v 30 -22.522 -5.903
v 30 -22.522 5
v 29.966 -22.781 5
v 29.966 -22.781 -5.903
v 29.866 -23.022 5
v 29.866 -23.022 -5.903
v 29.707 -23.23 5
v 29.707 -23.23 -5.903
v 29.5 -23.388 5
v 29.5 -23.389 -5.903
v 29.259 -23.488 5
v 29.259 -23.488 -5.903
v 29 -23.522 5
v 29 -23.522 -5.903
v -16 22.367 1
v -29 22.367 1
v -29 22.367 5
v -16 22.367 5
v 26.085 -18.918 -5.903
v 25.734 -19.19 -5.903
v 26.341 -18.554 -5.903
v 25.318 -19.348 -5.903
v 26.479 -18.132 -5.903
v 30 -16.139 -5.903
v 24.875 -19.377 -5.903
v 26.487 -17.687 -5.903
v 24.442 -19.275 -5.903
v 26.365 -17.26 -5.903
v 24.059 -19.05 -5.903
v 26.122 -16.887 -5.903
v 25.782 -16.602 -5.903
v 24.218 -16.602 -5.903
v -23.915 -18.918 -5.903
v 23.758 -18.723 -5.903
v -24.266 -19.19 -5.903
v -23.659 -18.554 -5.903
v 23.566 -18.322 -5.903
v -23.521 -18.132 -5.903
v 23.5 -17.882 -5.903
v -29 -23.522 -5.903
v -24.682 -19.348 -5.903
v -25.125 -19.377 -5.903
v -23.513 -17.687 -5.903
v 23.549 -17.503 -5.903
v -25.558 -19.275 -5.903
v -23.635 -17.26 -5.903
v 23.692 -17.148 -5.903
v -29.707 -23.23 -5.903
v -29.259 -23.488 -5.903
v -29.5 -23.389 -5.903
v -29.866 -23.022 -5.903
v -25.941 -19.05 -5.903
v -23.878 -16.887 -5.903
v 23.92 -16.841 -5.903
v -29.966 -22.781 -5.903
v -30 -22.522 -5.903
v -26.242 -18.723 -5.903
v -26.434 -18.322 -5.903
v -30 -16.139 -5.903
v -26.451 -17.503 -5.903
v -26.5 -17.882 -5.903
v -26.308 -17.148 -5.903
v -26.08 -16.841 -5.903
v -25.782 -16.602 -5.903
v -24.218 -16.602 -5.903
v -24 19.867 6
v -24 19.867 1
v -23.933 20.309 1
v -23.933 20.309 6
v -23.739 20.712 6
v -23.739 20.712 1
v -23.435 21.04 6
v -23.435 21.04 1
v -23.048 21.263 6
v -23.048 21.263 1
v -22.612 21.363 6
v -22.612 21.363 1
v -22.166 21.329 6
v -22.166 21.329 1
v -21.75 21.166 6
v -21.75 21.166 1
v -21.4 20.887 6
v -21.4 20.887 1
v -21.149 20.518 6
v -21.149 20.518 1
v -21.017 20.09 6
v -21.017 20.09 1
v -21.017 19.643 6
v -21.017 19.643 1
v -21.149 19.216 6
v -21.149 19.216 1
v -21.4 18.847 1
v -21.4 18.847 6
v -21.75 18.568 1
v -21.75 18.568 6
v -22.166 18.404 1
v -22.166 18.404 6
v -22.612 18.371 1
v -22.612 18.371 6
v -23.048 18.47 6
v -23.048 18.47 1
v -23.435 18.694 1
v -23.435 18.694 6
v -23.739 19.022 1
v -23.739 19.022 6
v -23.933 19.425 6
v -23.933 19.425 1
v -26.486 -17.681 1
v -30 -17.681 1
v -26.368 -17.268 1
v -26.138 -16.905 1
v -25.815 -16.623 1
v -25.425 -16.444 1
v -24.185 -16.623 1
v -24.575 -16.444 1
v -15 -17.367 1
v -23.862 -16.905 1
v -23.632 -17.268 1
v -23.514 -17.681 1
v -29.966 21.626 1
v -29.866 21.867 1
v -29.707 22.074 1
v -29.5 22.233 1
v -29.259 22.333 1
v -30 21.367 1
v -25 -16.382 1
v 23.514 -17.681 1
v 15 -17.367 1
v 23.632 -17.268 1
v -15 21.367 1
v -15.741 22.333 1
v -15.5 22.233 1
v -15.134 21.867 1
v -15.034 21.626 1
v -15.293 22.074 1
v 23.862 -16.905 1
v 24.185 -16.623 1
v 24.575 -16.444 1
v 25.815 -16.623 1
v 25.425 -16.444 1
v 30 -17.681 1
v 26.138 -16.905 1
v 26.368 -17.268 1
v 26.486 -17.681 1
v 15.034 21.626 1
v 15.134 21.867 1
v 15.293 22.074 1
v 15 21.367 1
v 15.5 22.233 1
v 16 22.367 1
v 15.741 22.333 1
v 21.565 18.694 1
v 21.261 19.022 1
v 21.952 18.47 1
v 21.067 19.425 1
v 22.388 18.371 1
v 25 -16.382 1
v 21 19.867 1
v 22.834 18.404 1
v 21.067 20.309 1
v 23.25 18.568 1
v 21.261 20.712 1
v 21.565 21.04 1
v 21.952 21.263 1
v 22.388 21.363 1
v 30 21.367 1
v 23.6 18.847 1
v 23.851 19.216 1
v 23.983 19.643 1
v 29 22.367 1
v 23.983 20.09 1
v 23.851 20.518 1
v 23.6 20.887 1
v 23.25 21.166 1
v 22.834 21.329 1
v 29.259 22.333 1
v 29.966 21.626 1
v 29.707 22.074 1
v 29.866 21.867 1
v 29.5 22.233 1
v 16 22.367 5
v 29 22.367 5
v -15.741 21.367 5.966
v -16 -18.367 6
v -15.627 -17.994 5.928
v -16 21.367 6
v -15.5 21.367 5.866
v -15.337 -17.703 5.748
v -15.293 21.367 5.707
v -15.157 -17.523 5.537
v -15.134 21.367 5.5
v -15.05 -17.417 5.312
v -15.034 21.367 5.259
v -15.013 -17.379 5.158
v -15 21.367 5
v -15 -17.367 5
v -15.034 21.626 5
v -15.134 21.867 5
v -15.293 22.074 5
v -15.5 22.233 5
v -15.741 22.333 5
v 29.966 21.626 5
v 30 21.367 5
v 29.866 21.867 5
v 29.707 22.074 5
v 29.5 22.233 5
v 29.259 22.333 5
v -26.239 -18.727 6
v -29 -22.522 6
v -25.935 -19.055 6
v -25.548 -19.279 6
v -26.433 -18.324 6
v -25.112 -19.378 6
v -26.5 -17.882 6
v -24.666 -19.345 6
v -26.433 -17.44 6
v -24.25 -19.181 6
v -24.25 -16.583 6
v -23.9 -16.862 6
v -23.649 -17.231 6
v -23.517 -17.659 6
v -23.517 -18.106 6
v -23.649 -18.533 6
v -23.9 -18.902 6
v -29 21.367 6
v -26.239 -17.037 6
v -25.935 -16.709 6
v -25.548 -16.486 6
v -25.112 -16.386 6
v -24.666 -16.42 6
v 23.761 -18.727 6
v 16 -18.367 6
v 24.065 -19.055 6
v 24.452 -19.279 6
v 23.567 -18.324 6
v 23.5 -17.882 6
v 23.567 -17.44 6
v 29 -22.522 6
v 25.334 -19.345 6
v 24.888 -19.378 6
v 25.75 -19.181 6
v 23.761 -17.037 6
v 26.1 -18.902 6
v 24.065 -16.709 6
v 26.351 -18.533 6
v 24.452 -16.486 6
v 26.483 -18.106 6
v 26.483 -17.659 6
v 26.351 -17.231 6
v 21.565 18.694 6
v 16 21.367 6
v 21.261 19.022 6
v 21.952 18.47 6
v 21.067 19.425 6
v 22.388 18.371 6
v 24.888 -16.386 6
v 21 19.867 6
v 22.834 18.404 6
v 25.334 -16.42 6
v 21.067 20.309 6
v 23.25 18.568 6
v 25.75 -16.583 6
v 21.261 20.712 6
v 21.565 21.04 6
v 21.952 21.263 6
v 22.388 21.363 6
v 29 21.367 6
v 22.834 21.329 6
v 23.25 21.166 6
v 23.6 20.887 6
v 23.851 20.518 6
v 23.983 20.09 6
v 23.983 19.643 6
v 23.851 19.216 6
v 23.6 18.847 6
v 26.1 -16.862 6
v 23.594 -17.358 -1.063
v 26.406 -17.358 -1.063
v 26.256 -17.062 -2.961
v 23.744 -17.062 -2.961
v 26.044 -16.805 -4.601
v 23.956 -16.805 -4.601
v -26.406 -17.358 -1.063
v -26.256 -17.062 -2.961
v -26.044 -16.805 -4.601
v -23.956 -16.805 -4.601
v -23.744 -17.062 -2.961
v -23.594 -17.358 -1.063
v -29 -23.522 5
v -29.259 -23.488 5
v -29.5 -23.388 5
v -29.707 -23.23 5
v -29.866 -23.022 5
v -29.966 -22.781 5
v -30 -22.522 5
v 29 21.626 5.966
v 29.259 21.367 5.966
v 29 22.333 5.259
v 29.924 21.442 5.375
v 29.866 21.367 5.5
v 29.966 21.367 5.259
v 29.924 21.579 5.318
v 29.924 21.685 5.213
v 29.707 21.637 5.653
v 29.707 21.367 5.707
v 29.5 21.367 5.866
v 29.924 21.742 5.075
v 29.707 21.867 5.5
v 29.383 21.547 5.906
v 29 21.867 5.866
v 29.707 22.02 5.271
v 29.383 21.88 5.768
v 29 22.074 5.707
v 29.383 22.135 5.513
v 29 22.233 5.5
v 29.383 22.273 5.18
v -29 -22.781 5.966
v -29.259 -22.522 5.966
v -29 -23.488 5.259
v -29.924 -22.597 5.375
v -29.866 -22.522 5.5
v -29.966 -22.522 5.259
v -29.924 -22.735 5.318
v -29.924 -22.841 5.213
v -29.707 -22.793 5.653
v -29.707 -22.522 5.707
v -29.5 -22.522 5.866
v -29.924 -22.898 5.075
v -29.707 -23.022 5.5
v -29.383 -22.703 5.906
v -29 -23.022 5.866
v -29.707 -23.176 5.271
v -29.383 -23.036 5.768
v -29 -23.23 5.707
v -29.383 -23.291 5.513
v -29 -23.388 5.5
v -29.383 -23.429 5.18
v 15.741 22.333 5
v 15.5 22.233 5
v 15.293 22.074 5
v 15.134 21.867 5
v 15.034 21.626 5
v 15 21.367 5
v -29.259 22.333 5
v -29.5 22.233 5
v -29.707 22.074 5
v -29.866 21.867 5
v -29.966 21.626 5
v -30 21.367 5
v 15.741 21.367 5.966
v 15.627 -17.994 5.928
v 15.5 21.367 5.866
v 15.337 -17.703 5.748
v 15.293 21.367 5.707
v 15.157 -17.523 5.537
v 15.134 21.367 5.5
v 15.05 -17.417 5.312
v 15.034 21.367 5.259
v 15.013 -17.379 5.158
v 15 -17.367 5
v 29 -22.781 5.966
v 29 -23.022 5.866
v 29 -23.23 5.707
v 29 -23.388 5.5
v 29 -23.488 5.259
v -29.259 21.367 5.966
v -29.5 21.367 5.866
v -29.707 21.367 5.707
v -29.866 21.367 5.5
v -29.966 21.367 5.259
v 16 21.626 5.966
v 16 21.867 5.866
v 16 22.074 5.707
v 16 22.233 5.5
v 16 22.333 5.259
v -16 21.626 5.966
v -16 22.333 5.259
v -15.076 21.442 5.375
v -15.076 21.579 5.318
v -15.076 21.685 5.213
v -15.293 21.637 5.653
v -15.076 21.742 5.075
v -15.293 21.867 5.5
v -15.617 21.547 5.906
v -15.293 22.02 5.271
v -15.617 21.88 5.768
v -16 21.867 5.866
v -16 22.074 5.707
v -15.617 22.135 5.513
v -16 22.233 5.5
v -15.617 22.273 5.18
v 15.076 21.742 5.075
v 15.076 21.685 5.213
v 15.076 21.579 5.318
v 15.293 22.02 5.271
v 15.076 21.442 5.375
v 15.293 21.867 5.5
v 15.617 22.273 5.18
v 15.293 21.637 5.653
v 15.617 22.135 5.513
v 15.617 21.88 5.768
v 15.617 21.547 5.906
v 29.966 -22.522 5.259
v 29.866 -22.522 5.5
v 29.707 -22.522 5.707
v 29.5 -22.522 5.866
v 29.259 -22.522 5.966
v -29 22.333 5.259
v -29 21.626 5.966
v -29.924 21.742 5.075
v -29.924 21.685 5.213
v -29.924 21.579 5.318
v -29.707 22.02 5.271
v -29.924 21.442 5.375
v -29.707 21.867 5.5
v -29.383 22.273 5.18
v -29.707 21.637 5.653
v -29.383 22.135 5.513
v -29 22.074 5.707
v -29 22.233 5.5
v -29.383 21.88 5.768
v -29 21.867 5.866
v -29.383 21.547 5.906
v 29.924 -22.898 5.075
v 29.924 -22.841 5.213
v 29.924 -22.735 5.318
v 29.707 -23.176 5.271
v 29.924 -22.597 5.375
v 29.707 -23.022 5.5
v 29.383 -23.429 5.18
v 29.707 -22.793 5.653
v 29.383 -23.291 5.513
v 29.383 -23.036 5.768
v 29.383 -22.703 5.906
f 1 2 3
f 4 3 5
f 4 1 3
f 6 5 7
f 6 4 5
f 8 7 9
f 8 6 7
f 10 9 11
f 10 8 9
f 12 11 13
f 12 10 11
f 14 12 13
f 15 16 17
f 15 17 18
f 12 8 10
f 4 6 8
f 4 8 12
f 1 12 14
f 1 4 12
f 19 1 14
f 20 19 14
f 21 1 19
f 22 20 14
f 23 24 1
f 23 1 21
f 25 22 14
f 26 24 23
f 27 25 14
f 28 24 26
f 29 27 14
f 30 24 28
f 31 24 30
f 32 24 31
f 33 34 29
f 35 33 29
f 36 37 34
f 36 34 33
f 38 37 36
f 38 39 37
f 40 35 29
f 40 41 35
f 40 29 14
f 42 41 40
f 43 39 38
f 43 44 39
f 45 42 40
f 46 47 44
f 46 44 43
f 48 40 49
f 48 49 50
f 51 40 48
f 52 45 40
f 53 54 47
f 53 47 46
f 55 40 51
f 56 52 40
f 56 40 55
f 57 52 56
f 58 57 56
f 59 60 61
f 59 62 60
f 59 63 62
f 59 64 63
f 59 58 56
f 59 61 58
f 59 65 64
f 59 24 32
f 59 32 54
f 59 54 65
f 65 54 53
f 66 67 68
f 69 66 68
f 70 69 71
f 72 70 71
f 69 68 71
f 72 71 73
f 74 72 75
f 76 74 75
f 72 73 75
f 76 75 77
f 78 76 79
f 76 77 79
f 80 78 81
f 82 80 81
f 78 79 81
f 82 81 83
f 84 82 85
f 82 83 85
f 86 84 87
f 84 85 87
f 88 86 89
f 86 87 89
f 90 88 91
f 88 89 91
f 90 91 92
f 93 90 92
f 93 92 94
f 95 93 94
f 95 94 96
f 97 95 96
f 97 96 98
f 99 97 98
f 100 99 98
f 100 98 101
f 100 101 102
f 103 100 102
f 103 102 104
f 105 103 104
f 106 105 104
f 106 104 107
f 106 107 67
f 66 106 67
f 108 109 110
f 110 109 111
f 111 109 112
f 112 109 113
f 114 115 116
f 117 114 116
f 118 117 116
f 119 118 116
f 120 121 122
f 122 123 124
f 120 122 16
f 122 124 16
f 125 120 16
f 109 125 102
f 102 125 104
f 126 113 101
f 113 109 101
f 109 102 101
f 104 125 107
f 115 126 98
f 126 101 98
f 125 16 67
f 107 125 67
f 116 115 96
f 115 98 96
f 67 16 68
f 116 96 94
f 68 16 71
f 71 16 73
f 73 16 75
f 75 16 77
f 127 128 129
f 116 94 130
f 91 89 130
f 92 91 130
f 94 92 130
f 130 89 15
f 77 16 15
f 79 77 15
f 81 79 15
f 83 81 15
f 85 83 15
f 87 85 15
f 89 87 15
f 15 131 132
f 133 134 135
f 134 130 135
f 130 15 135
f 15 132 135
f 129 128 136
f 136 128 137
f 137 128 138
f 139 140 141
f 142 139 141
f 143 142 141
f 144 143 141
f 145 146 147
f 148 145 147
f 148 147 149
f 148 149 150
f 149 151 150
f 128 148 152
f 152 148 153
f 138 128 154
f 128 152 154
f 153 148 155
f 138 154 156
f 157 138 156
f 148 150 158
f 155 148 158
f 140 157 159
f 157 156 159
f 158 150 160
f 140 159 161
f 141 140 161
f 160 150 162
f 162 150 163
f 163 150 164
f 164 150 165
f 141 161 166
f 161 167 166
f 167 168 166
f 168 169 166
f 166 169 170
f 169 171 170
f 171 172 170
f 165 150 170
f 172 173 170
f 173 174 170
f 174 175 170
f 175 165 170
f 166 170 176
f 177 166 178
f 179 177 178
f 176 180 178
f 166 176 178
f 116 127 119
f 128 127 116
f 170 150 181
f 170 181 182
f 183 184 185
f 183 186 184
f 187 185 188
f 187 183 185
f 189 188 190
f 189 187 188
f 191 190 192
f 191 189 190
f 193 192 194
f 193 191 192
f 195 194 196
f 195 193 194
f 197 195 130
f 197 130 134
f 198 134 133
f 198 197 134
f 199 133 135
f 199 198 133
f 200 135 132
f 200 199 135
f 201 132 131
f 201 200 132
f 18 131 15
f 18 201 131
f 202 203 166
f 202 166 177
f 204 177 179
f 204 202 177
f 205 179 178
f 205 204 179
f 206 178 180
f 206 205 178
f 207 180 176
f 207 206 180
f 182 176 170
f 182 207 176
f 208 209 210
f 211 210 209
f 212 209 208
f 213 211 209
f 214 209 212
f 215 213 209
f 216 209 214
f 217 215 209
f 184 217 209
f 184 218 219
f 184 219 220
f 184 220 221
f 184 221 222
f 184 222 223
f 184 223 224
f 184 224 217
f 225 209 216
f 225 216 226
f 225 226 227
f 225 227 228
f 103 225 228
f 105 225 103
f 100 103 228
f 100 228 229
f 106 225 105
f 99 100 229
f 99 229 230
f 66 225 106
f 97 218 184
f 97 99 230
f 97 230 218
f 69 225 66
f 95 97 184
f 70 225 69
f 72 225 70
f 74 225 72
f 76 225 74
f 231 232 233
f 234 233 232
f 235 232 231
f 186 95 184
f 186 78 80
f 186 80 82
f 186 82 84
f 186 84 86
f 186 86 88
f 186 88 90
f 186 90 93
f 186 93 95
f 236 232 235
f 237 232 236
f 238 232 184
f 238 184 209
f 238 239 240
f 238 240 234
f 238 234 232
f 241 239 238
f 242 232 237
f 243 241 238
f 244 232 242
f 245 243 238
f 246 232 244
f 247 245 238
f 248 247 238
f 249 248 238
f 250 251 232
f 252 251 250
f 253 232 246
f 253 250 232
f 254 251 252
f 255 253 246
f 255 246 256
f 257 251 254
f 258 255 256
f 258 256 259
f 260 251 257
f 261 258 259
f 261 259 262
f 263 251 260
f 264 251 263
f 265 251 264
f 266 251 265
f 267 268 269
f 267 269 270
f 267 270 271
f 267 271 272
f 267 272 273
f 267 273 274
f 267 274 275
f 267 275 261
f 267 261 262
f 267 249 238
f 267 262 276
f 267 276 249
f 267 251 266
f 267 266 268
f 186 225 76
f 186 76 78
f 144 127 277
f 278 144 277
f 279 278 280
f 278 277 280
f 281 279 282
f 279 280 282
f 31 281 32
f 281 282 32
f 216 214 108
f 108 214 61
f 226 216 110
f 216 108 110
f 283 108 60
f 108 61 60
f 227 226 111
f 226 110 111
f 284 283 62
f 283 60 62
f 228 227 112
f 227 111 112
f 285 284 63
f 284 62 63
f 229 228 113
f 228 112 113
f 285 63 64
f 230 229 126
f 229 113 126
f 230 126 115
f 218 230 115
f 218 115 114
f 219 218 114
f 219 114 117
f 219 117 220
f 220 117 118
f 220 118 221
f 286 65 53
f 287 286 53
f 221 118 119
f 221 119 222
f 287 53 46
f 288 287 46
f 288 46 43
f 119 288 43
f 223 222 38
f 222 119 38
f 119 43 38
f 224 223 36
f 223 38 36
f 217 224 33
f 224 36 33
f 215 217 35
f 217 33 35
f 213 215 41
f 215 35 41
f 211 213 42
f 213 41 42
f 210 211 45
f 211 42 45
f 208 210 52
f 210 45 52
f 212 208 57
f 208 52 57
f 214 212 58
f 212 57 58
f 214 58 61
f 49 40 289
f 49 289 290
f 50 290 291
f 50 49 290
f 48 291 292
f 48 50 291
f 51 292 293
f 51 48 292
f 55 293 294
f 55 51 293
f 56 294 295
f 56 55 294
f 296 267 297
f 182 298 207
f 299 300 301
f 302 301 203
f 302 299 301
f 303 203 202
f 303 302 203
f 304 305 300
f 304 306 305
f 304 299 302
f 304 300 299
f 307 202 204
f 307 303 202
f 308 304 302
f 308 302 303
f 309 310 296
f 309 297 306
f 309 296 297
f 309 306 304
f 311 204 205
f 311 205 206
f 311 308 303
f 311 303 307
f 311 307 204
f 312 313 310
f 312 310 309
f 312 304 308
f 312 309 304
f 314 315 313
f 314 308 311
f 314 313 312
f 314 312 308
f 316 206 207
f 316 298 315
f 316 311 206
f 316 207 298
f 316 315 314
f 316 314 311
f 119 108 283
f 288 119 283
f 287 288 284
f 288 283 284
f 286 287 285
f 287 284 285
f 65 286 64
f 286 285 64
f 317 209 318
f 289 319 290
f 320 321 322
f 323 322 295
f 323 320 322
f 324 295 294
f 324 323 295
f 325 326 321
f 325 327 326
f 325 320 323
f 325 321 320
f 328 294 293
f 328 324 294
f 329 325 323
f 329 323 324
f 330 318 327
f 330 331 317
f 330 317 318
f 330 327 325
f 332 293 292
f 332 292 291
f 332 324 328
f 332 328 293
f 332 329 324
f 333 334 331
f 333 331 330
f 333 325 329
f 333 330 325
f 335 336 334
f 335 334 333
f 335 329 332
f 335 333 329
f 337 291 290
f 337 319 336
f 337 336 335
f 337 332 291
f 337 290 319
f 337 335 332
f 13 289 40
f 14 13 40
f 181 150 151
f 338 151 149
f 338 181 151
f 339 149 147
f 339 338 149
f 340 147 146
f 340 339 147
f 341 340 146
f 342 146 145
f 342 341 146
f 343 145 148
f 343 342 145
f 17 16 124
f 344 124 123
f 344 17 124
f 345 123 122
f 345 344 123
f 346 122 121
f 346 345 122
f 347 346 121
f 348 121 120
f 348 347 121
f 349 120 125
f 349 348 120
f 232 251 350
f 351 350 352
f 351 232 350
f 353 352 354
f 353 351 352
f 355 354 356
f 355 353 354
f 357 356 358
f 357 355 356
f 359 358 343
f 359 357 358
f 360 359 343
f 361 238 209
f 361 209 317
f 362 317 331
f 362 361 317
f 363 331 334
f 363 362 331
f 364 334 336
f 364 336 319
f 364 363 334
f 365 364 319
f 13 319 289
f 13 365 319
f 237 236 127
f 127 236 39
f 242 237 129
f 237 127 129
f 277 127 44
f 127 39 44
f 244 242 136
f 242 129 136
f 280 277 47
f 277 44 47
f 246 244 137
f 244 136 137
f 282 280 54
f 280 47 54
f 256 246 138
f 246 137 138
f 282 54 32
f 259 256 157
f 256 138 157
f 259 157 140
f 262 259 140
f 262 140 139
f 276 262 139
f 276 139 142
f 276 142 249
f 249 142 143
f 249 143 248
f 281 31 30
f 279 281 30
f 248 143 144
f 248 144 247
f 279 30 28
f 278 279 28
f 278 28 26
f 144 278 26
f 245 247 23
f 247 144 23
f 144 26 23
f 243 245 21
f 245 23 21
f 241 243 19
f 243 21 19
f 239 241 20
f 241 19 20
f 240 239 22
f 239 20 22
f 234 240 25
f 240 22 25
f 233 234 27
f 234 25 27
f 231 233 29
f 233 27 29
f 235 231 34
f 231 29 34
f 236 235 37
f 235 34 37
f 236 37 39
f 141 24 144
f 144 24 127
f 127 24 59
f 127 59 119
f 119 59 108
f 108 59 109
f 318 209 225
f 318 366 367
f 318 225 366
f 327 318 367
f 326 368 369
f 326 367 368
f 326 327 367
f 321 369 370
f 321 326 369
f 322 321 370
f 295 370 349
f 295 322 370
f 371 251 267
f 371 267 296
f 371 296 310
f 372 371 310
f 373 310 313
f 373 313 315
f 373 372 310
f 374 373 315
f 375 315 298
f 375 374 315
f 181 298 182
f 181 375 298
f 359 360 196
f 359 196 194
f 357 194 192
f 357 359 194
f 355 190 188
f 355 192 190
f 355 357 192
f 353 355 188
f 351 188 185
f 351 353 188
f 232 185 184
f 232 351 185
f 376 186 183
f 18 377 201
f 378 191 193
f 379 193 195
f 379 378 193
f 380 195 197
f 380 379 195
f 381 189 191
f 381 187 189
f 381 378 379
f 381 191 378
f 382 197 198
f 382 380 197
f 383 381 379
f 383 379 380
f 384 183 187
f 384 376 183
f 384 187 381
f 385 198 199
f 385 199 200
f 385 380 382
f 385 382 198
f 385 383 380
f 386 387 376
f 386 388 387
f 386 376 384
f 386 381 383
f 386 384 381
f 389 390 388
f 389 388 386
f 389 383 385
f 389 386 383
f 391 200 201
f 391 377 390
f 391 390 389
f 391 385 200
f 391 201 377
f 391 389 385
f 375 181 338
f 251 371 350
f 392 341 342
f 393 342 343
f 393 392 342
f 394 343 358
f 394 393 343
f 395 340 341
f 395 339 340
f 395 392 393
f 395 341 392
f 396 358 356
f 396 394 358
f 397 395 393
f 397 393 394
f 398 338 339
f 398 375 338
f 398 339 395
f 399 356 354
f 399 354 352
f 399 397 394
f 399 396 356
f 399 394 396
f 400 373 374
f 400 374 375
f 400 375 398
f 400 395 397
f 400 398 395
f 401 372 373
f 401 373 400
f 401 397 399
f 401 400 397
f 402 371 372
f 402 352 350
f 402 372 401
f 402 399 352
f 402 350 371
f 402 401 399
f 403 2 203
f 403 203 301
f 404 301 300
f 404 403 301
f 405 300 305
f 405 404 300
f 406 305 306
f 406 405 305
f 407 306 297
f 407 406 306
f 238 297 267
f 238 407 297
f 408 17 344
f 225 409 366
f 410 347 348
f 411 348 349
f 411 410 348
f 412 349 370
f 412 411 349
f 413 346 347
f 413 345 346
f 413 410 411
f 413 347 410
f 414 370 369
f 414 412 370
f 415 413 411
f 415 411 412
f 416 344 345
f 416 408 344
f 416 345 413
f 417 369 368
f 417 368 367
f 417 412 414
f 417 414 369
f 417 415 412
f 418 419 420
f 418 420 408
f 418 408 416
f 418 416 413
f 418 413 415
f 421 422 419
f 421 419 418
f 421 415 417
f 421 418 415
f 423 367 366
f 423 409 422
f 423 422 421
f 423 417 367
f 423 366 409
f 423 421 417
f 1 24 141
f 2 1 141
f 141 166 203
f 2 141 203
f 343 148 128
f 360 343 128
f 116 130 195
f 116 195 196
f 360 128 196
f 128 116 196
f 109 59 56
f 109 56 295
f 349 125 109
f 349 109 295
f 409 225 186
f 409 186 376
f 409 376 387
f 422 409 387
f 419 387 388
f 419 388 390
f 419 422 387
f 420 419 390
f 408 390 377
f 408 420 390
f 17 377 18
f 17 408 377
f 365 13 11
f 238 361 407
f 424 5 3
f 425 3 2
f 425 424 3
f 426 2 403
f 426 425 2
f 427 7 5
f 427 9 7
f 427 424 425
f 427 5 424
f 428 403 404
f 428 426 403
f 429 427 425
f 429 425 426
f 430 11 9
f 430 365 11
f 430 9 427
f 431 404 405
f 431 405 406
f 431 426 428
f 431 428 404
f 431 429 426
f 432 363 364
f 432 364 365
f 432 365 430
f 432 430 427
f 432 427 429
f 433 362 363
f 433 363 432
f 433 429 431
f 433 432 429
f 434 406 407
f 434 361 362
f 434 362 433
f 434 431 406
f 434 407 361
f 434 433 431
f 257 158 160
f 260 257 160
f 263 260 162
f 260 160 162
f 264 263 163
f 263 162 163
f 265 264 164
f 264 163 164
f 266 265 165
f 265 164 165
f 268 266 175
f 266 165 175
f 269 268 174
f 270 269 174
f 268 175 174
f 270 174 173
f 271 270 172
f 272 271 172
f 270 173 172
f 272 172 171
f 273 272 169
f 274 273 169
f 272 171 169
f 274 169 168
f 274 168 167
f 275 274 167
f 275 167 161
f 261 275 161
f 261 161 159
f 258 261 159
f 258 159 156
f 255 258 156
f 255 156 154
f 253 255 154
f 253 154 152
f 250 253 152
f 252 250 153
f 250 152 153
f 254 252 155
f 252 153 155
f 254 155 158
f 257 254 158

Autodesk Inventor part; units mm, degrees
ref_plane "YZ Plane" through (0, 0, 0) normal (1, 0, 0) x (0, 1, 0)
ref_plane "XZ Plane" through (0, 0, 0) normal (0, 1, 0) x (-1, 0, 0)
ref_plane "Work Plane1" through (0, 0, 1) normal (0, 0, 1) x (1, 0, 0)
sketch "Sketch2" plane through (0, 0, 1) normal (0, 0, 1) x (1, 0, 0)
  line L0 (-29.9972, 16.3668) -> (29.9972, 16.3668) construction
  line L1 (29.9972, -16.3668) -> (-29.9972, -16.3668) construction
  circle A0 centre (0, 0) radius 8 construction
  line L2 (-18, -2.183) -> (-18, 3.067) construction
  line L3 (17.5, -1.0311) -> (17.5, 1.567) construction
  line L4 (0, 16.3668) -> (0, 17.3668) construction
  line L5 (0, -16.3668) -> (0, -17.3668) construction
  line L6 (0, 17.3668) -> (-30, 17.3668) construction
  line L7 (0, 17.3668) -> (30, 17.3668) construction
  line L8 (-30, 17.3668) -> (30, 17.3668) construction
  line L9 (30, 17.3668) -> (30, -17.3668) construction
  line L10 (30, -17.3668) -> (-30, -17.3668) construction
  line L11 (-30, -17.3668) -> (-30, 17.3668) construction
  line L12 (-30, 17.3668) -> (-15, 17.3668)
  line L13 (-15, 17.3668) -> (-15, -17.3668)
  line L14 (-15, -17.3668) -> (-30, -17.3668)
  line L15 (-30, -17.3668) -> (-30, 17.3668)
  line L16 (30, 17.3668) -> (15, 17.3668)
  line L17 (15, 17.3668) -> (15, -17.3668)
  line L18 (15, -17.3668) -> (30, -17.3668)
  line L19 (30, -17.3668) -> (30, 17.3668)
  point P0 (0, 0)
  dimension "d0" = 1
  dimension "d1" = 1
  dimension "d2" = 30
  dimension "d3" = 30
  dimension "d4" = 15
  dimension "d5" = 15
extrude "Extrusion1" add sketch "Sketch2" along normal blind 5
ref_plane "Work Plane2" through (0, -13.2935, -27.0771) normal (0, -0.988012, -0.1543769) x (-1, 0, 0)
sketch "Sketch3" plane through (0, -13.2935, -27.0771) normal (0, -0.988012, -0.1543769) x (-1, 0, 0)
  line L0 (15, -28.3694) -> (30, -28.3694) projected
  line L1 (15, -28.3694) -> (15, -33.3094) projected
  line L2 (30, -33.3094) -> (15, -33.3094) projected
  line L3 (30, -28.3694) -> (30, -33.3094) projected
  line L4 (-15, -28.3694) -> (-30, -28.3694) projected
  line L5 (-30, -28.3694) -> (-30, -33.3094) projected
  line L6 (-15, -33.3094) -> (-30, -33.3094) projected
  line L7 (-15, -28.3694) -> (-15, -33.3094) projected
  line L8 (-24.9964, -11.75) -> (24.9964, -11.75) projected
  line L9 (-30, -33.3094) -> (30, -33.3094)
  line L10 (30, -33.3094) -> (30, -11.3094)
  line L11 (30, -11.3094) -> (-30, -11.3094)
  line L12 (-30, -11.3094) -> (-30, -33.3094)
  point P0 (0, -24.7003)
  dimension "d8" = 60
  dimension "d9" = 22
extrude "Extrusion2" add sketch "Sketch3" along normal blind 5
sketch "Sketch5" plane through (-30, -17.3668, 1) normal (-1, 0, 0) x (0, 0, 1)
  line L0 (0, 0) -> (0, 34.7337) projected
  line L1 (0, 0) -> (5, 0) projected
  line L2 (5, 34.7337) -> (5, 0) projected
  line L3 (0, 34.7337) -> (5, 34.7337) projected
  line L4 (4.833, -1.0688) -> (-16.9033, 2.3275) projected
  line L5 (-16.9033, 2.3275) -> (-17.6752, -2.6126) projected
  line L6 (4.0611, -6.0089) -> (-17.6752, -2.6126) projected
  line L7 (4.833, -1.0688) -> (4.0611, -6.0089) projected
  line L8 (5, 0) -> (5, -6.1556)
  line L9 (4.0611, -6.0089) -> (-17.6752, -2.6126) projected
  line L10 (5, -6.1556) -> (4.0611, -6.0089)
  line L11 (0, 0) -> (5, 0) projected
  line L12 (0, 0) -> (0, -3.0778)
  line L13 (4.833, -1.0688) -> (4.0611, -6.0089) projected
  line L14 (0, -3.0778) -> (4.0611, -6.0089)
  point P0 (-1, 17.3668)
extrude "Extrusion3" add sketch "Sketch5" against normal up to surface (60 mm away) contours L1 L8 L10 L7 L4 L12 | L4 L7 L14 L12
sketch "Sketch6" plane through (-30, 17.3668, 1) normal (-1, 0, 0) x (0, 0, 1)
  line L0 (0, -35.0474) -> (0, 0) projected
  line L1 (0, -35.0474) -> (-16.9033, -32.4062) projected
  line L2 (-16.9033, -32.4062) -> (-17.6752, -37.3463) projected
  line L3 (-17.6752, -37.3463) -> (5, -40.8893) projected
  line L4 (5, 0) -> (5, -40.8893) projected
  line L5 (0, 0) -> (5, 0) projected
  line L6 (-16.9033, -32.4062) -> (-24.0532, -32.4062)
  line L7 (-24.0532, -32.4062) -> (-24.0532, -41.4181)
  line L8 (-24.0532, -41.4181) -> (-16.9033, -41.4181)
  line L9 (-16.9033, -41.4181) -> (-16.9033, -32.4062)
  line L10 (-16.9033, -32.4062) -> (-14.9033, -32.4062)
  line L11 (-14.9033, -32.4062) -> (-14.9033, -41.4181)
  line L12 (-14.9033, -41.4181) -> (-16.9033, -41.4181)
  line L13 (-16.9033, -41.4181) -> (-16.9033, -32.4062)
  point P0 (-1, -17.3668)
  dimension "d18" = 2
extrude "Extrusion4" cut sketch "Sketch6" against normal through all contours L11 L3 L9 L1 | L1 L10 L11 | L9 L3 L2 | L2 L3 L9 L8 L7 L6 | L11 L12 L9 L3
sketch "Sketch7" plane through (-30, 17.3668, 1) normal (0, 1, 0) x (1, 0, 0)
  line L0 (0, 0) -> (15, 0) projected
  line L1 (0, 0) -> (0, -5) projected
  line L2 (15, -5) -> (0, -5) projected
  line L3 (15, 0) -> (15, -5) projected
  line L4 (60, 0) -> (45, 0) projected
  line L5 (45, 0) -> (45, -5) projected
  line L6 (60, -5) -> (45, -5) projected
  line L7 (60, 0) -> (60, -5) projected
  point P0 (30, 1)
extrude "Extrusion5" add sketch "Sketch7" along normal blind 5
ref_plane "Work Plane3" through (-30, -20.4125, -11.9033) normal (0, 0, -1) x (-1, 0, 0)
sketch "Sketch8" plane through (-30, -20.4125, -11.9033) normal (0, 0, -1) x (-1, 0, 0)
  line L0 (-7.7, 0) -> (-6, 0) projected
  line L1 (-2.3, 5.0607) -> (-7.7, 5.0607) projected
  circle A0 centre (-5, 2.5303) radius 1.5 projected
  line L2 (-7.7, 0) -> (-6, 0) projected
  line L3 (-57.6, 0) -> (-52.4, 0)
  line L4 (-52.4, 0) -> (-52.4, -6.7313)
  line L5 (-52.4, -6.7313) -> (-57.6, -6.7313)
  line L6 (-57.6, -6.7313) -> (-57.6, 0)
  line L7 (-7.6, 1.0292) -> (-2.4, 1.0292)
  line L8 (-2.4, 1.0292) -> (-2.4, -4.6372)
  line L9 (-2.4, -4.6372) -> (-7.6, -4.6372)
  line L10 (-7.6, -4.6372) -> (-7.6, 1.0292)
  line L11 (-6, 0) -> (-2.3, 0) projected
  line L12 (-2.3, 5.0607) -> (-7.7, 5.0607) projected
  line L13 (-6, 0) -> (-2.3, 0) projected
  circle A1 centre (-5, 2.5303) radius 1.5 projected
  line L14 (-7.7, 5.0607) -> (-7.7, 0) projected
  line L15 (-2.3, 0) -> (-2.3, 5.0607) projected
  line L16 (-7.7, 5.0607) -> (-7.7, 0) projected
  line L17 (-2.3, 0) -> (-2.3, 5.0607) projected
  point P0 (-30, 20.4125)
  point P1 (-7.2835, 0)
  point P2 (-2.4, 0)
  point P3 (-7.2835, 0.8465)
  point P4 (-7.6, 1.0292)
  point P5 (-7.6, 4.0314)
  point P6 (-5.8173, 5.0607)
  point P7 (-4.1827, 5.0607)
  point P8 (-2.4, 4.0314)
extrude "Extrusion6" [suppressed]
sketch "Sketch9" plane through (-30, -20.4125, -13.9033) normal (0, 0, -1) x (-1, 0, 0)
  circle A0 centre (-55, 2.5303) radius 1.5 projected
  circle A1 centre (-5, 2.5303) radius 1.5 projected
  point P0 (-30, 20.4125)
extrude "Extrusion7" cut sketch "Sketch9" against normal blind 8
sketch "Sketch10" plane through (0, 0, 1) normal (0, 0, -1) x (-1, 0, 0)
  line L0 (15, 22.3649) -> (15, 22.3668) projected
  line L1 (30, 22.3668) -> (30, 22.3649) projected
  line L2 (30, 22.3668) -> (15, 22.3668) projected
  line L3 (-30, 22.3649) -> (-30, 22.3668) projected
  line L4 (-15, 22.3668) -> (-15, 22.3649) projected
  line L5 (-15, 22.3668) -> (-30, 22.3668) projected
  line L6 (-15, 22.3668) -> (-30, 22.3668) projected
  line L7 (-30, 22.3668) -> (-30, 19.8668)
  line L8 (-30, 22.3668) -> (-30, -17.6805) projected
  line L9 (-30, 19.8668) -> (-22.5, 19.8668)
  line L10 (30, 22.3668) -> (30, 19.8668)
  line L11 (30, -17.6805) -> (30, 22.3668) projected
  line L12 (30, 19.8668) -> (22.5, 19.8668)
  circle A0 centre (-22.5, 19.8668) radius 1.5
  circle A1 centre (22.5, 19.8668) radius 1.5
  line L13 (15, 22.3649) -> (30, 22.3649) projected
  line L14 (-30, 22.3649) -> (-15, 22.3649) projected
  point P0 (0, 0)
  point P1 (30, 17.3668)
  point P2 (-30, 17.3668)
  dimension "d24" = 2.5
  dimension "d25" = 7.5
  dimension "d26" = 2.5
  dimension "d27" = 7.5
  dimension "d28" = 3
  dimension "d29" = 3
extrude "Extrusion8" cut sketch "Sketch10" against normal through all
sketch "Sketch11" plane through (-30, -20.4125, -13.9033) normal (0, 0, -1) x (-1, 0, 0)
  circle A0 centre (-55, 2.5303) radius 1.5 projected
  circle A1 centre (-5, 2.5303) radius 1.5 projected
  point P0 (-30, 20.4125)
extrude "Extrusion9" cut sketch "Sketch11" against normal through all
sketch "Sketch12" plane through (-30, -20.4125, -13.9033) normal (-1, 0, 0) x (0, 0, 1)
  line L0 (0, 5.0607) -> (0, 0) projected
  line L1 (0, 0) -> (19.9033, -3.1099) projected
  line L2 (19.9033, -3.1099) -> (19.9033, 42.7794) projected
  line L3 (14.9033, 42.7794) -> (19.9033, 42.7794) projected
  line L4 (14.9033, 2.732) -> (14.9033, 42.7794) projected
  line L5 (14.9033, 2.732) -> (0, 5.0607) projected
  line L6 (0, 5.0607) -> (0, 6.0607)
  line L7 (6.5941, 4.0303) -> (14.9033, 2.732) projected
  line L8 (0, 6.0607) -> (14.9033, 2.732)
  point P0 (13.9033, 20.4125)
  dimension "d34" = 1
extrude "Extrusion10" add sketch "Sketch12" against normal up to surface (60 mm away) contours L6 L8 L5
sketch "Sketch13" plane through (-30, -23.5224, 6) normal (-1, 0, 0) x (0, 0, 1)
  line L0 (-19.9033, 4.1402) -> (0, 4.1402) projected
  line L1 (-19.9033, 7.1402) -> (0, 7.1402) projected
  line L2 (-19.9033, 9.1706) -> (-19.9033, 3.1099) construction
  line L3 (-19.9033, 3.1099) -> (0, 0) construction
  line L4 (0, 0) -> (0, 45.8893) construction
  line L5 (-5, 45.8893) -> (0, 45.8893) projected
  line L6 (-5, 5.8419) -> (-5, 45.8893) projected
  line L7 (-5, 5.8419) -> (-19.9033, 9.1706) projected
  line L8 (-19.9033, 3.1099) -> (0, 3.1099)
  line L9 (0, 3.1099) -> (0, 0)
  line L10 (0, 0) -> (-19.9033, 0)
  line L11 (-19.9033, 0) -> (-19.9033, 3.1099)
  point P0 (-6, 23.5224)
extrude "Extrusion11" add sketch "Sketch13" against normal up to surface (60 mm away) contours L8 L9 L10 L11
fillet "Fillet1" radius 1 14 edges at (0, -23.5224, 6) (-22.5, 22.3668, 6) (22.5, 22.3668, 6) (-30, -0.5778, 6) (-15, 2.5, 6) (0, -17.3668, 6) (15, 2.5, 6) (30, -0.5778, 6) (-30, -23.5224, -3.9516) (30, -23.5224, -3.9516) (-30, 22.3668, 3.5) (-15, 22.3668, 3.5) (15, 22.3668, 3.5) (30, 22.3668, 3.5)
sketch "Sketch14" plane through (30, -14.3519, -13.9033) normal (0, 0, -1) x (-1, 0, 0)
  circle A0 centre (5, -3.5303) radius 1.5 projected
  circle A1 centre (55, -3.5303) radius 1.5 projected
  line L0 (60, -8.1706) -> (60, 0) projected
  line L1 (60, 0) -> (0, 0) projected
  line L2 (0, 0) -> (0, -8.1706) projected
  line L3 (59, -9.1706) -> (1, -9.1706) projected
  arc A2 (59, -9.1706) -> (60, -8.1706) centre (59, -8.1706) ccw projected
  arc A3 (0, -8.1706) -> (1, -9.1706) centre (1, -8.1706) ccw projected
  point P0 (30, 14.3519)
extrude "Extrusion12" cut sketch "Sketch14" against normal blind 8
sketch "Sketch15" plane through (-30, -17.6805, 1) normal (-1, 0, 0) x (0, 0, 1)
  line L0 (-6.9033, 1.5418) -> (-6.9033, -4.8419) projected
  line L1 (4, 39.0474) -> (4, -4.8419) projected
  line L2 (0, 0) -> (0, 39.0474) projected
  line L3 (0, 0) -> (-6.9033, 1.5418) projected
  line L4 (4, -5.8419) -> (-6.9033, -5.8419) projected
  line L5 (-6.9033, -5.8419) -> (-43.1083, -5.8419)
  line L6 (-43.1083, -5.8419) -> (-43.1083, 9.6282)
  line L7 (-43.1083, 9.6282) -> (-6.9033, 9.6282)
  line L8 (-6.9033, 9.6282) -> (-6.9033, -5.8419)
  line L9 (4, -4.8419) -> (-6.9033, -4.8419) projected
  line L10 (0, 39.0474) -> (4, 39.0474) projected
  point P0 (-1, 17.6805)
extrude "Extrusion13" cut sketch "Sketch15" against normal through all contours L0 L8 L5 L6 L7
properties part number "camera_holder"
